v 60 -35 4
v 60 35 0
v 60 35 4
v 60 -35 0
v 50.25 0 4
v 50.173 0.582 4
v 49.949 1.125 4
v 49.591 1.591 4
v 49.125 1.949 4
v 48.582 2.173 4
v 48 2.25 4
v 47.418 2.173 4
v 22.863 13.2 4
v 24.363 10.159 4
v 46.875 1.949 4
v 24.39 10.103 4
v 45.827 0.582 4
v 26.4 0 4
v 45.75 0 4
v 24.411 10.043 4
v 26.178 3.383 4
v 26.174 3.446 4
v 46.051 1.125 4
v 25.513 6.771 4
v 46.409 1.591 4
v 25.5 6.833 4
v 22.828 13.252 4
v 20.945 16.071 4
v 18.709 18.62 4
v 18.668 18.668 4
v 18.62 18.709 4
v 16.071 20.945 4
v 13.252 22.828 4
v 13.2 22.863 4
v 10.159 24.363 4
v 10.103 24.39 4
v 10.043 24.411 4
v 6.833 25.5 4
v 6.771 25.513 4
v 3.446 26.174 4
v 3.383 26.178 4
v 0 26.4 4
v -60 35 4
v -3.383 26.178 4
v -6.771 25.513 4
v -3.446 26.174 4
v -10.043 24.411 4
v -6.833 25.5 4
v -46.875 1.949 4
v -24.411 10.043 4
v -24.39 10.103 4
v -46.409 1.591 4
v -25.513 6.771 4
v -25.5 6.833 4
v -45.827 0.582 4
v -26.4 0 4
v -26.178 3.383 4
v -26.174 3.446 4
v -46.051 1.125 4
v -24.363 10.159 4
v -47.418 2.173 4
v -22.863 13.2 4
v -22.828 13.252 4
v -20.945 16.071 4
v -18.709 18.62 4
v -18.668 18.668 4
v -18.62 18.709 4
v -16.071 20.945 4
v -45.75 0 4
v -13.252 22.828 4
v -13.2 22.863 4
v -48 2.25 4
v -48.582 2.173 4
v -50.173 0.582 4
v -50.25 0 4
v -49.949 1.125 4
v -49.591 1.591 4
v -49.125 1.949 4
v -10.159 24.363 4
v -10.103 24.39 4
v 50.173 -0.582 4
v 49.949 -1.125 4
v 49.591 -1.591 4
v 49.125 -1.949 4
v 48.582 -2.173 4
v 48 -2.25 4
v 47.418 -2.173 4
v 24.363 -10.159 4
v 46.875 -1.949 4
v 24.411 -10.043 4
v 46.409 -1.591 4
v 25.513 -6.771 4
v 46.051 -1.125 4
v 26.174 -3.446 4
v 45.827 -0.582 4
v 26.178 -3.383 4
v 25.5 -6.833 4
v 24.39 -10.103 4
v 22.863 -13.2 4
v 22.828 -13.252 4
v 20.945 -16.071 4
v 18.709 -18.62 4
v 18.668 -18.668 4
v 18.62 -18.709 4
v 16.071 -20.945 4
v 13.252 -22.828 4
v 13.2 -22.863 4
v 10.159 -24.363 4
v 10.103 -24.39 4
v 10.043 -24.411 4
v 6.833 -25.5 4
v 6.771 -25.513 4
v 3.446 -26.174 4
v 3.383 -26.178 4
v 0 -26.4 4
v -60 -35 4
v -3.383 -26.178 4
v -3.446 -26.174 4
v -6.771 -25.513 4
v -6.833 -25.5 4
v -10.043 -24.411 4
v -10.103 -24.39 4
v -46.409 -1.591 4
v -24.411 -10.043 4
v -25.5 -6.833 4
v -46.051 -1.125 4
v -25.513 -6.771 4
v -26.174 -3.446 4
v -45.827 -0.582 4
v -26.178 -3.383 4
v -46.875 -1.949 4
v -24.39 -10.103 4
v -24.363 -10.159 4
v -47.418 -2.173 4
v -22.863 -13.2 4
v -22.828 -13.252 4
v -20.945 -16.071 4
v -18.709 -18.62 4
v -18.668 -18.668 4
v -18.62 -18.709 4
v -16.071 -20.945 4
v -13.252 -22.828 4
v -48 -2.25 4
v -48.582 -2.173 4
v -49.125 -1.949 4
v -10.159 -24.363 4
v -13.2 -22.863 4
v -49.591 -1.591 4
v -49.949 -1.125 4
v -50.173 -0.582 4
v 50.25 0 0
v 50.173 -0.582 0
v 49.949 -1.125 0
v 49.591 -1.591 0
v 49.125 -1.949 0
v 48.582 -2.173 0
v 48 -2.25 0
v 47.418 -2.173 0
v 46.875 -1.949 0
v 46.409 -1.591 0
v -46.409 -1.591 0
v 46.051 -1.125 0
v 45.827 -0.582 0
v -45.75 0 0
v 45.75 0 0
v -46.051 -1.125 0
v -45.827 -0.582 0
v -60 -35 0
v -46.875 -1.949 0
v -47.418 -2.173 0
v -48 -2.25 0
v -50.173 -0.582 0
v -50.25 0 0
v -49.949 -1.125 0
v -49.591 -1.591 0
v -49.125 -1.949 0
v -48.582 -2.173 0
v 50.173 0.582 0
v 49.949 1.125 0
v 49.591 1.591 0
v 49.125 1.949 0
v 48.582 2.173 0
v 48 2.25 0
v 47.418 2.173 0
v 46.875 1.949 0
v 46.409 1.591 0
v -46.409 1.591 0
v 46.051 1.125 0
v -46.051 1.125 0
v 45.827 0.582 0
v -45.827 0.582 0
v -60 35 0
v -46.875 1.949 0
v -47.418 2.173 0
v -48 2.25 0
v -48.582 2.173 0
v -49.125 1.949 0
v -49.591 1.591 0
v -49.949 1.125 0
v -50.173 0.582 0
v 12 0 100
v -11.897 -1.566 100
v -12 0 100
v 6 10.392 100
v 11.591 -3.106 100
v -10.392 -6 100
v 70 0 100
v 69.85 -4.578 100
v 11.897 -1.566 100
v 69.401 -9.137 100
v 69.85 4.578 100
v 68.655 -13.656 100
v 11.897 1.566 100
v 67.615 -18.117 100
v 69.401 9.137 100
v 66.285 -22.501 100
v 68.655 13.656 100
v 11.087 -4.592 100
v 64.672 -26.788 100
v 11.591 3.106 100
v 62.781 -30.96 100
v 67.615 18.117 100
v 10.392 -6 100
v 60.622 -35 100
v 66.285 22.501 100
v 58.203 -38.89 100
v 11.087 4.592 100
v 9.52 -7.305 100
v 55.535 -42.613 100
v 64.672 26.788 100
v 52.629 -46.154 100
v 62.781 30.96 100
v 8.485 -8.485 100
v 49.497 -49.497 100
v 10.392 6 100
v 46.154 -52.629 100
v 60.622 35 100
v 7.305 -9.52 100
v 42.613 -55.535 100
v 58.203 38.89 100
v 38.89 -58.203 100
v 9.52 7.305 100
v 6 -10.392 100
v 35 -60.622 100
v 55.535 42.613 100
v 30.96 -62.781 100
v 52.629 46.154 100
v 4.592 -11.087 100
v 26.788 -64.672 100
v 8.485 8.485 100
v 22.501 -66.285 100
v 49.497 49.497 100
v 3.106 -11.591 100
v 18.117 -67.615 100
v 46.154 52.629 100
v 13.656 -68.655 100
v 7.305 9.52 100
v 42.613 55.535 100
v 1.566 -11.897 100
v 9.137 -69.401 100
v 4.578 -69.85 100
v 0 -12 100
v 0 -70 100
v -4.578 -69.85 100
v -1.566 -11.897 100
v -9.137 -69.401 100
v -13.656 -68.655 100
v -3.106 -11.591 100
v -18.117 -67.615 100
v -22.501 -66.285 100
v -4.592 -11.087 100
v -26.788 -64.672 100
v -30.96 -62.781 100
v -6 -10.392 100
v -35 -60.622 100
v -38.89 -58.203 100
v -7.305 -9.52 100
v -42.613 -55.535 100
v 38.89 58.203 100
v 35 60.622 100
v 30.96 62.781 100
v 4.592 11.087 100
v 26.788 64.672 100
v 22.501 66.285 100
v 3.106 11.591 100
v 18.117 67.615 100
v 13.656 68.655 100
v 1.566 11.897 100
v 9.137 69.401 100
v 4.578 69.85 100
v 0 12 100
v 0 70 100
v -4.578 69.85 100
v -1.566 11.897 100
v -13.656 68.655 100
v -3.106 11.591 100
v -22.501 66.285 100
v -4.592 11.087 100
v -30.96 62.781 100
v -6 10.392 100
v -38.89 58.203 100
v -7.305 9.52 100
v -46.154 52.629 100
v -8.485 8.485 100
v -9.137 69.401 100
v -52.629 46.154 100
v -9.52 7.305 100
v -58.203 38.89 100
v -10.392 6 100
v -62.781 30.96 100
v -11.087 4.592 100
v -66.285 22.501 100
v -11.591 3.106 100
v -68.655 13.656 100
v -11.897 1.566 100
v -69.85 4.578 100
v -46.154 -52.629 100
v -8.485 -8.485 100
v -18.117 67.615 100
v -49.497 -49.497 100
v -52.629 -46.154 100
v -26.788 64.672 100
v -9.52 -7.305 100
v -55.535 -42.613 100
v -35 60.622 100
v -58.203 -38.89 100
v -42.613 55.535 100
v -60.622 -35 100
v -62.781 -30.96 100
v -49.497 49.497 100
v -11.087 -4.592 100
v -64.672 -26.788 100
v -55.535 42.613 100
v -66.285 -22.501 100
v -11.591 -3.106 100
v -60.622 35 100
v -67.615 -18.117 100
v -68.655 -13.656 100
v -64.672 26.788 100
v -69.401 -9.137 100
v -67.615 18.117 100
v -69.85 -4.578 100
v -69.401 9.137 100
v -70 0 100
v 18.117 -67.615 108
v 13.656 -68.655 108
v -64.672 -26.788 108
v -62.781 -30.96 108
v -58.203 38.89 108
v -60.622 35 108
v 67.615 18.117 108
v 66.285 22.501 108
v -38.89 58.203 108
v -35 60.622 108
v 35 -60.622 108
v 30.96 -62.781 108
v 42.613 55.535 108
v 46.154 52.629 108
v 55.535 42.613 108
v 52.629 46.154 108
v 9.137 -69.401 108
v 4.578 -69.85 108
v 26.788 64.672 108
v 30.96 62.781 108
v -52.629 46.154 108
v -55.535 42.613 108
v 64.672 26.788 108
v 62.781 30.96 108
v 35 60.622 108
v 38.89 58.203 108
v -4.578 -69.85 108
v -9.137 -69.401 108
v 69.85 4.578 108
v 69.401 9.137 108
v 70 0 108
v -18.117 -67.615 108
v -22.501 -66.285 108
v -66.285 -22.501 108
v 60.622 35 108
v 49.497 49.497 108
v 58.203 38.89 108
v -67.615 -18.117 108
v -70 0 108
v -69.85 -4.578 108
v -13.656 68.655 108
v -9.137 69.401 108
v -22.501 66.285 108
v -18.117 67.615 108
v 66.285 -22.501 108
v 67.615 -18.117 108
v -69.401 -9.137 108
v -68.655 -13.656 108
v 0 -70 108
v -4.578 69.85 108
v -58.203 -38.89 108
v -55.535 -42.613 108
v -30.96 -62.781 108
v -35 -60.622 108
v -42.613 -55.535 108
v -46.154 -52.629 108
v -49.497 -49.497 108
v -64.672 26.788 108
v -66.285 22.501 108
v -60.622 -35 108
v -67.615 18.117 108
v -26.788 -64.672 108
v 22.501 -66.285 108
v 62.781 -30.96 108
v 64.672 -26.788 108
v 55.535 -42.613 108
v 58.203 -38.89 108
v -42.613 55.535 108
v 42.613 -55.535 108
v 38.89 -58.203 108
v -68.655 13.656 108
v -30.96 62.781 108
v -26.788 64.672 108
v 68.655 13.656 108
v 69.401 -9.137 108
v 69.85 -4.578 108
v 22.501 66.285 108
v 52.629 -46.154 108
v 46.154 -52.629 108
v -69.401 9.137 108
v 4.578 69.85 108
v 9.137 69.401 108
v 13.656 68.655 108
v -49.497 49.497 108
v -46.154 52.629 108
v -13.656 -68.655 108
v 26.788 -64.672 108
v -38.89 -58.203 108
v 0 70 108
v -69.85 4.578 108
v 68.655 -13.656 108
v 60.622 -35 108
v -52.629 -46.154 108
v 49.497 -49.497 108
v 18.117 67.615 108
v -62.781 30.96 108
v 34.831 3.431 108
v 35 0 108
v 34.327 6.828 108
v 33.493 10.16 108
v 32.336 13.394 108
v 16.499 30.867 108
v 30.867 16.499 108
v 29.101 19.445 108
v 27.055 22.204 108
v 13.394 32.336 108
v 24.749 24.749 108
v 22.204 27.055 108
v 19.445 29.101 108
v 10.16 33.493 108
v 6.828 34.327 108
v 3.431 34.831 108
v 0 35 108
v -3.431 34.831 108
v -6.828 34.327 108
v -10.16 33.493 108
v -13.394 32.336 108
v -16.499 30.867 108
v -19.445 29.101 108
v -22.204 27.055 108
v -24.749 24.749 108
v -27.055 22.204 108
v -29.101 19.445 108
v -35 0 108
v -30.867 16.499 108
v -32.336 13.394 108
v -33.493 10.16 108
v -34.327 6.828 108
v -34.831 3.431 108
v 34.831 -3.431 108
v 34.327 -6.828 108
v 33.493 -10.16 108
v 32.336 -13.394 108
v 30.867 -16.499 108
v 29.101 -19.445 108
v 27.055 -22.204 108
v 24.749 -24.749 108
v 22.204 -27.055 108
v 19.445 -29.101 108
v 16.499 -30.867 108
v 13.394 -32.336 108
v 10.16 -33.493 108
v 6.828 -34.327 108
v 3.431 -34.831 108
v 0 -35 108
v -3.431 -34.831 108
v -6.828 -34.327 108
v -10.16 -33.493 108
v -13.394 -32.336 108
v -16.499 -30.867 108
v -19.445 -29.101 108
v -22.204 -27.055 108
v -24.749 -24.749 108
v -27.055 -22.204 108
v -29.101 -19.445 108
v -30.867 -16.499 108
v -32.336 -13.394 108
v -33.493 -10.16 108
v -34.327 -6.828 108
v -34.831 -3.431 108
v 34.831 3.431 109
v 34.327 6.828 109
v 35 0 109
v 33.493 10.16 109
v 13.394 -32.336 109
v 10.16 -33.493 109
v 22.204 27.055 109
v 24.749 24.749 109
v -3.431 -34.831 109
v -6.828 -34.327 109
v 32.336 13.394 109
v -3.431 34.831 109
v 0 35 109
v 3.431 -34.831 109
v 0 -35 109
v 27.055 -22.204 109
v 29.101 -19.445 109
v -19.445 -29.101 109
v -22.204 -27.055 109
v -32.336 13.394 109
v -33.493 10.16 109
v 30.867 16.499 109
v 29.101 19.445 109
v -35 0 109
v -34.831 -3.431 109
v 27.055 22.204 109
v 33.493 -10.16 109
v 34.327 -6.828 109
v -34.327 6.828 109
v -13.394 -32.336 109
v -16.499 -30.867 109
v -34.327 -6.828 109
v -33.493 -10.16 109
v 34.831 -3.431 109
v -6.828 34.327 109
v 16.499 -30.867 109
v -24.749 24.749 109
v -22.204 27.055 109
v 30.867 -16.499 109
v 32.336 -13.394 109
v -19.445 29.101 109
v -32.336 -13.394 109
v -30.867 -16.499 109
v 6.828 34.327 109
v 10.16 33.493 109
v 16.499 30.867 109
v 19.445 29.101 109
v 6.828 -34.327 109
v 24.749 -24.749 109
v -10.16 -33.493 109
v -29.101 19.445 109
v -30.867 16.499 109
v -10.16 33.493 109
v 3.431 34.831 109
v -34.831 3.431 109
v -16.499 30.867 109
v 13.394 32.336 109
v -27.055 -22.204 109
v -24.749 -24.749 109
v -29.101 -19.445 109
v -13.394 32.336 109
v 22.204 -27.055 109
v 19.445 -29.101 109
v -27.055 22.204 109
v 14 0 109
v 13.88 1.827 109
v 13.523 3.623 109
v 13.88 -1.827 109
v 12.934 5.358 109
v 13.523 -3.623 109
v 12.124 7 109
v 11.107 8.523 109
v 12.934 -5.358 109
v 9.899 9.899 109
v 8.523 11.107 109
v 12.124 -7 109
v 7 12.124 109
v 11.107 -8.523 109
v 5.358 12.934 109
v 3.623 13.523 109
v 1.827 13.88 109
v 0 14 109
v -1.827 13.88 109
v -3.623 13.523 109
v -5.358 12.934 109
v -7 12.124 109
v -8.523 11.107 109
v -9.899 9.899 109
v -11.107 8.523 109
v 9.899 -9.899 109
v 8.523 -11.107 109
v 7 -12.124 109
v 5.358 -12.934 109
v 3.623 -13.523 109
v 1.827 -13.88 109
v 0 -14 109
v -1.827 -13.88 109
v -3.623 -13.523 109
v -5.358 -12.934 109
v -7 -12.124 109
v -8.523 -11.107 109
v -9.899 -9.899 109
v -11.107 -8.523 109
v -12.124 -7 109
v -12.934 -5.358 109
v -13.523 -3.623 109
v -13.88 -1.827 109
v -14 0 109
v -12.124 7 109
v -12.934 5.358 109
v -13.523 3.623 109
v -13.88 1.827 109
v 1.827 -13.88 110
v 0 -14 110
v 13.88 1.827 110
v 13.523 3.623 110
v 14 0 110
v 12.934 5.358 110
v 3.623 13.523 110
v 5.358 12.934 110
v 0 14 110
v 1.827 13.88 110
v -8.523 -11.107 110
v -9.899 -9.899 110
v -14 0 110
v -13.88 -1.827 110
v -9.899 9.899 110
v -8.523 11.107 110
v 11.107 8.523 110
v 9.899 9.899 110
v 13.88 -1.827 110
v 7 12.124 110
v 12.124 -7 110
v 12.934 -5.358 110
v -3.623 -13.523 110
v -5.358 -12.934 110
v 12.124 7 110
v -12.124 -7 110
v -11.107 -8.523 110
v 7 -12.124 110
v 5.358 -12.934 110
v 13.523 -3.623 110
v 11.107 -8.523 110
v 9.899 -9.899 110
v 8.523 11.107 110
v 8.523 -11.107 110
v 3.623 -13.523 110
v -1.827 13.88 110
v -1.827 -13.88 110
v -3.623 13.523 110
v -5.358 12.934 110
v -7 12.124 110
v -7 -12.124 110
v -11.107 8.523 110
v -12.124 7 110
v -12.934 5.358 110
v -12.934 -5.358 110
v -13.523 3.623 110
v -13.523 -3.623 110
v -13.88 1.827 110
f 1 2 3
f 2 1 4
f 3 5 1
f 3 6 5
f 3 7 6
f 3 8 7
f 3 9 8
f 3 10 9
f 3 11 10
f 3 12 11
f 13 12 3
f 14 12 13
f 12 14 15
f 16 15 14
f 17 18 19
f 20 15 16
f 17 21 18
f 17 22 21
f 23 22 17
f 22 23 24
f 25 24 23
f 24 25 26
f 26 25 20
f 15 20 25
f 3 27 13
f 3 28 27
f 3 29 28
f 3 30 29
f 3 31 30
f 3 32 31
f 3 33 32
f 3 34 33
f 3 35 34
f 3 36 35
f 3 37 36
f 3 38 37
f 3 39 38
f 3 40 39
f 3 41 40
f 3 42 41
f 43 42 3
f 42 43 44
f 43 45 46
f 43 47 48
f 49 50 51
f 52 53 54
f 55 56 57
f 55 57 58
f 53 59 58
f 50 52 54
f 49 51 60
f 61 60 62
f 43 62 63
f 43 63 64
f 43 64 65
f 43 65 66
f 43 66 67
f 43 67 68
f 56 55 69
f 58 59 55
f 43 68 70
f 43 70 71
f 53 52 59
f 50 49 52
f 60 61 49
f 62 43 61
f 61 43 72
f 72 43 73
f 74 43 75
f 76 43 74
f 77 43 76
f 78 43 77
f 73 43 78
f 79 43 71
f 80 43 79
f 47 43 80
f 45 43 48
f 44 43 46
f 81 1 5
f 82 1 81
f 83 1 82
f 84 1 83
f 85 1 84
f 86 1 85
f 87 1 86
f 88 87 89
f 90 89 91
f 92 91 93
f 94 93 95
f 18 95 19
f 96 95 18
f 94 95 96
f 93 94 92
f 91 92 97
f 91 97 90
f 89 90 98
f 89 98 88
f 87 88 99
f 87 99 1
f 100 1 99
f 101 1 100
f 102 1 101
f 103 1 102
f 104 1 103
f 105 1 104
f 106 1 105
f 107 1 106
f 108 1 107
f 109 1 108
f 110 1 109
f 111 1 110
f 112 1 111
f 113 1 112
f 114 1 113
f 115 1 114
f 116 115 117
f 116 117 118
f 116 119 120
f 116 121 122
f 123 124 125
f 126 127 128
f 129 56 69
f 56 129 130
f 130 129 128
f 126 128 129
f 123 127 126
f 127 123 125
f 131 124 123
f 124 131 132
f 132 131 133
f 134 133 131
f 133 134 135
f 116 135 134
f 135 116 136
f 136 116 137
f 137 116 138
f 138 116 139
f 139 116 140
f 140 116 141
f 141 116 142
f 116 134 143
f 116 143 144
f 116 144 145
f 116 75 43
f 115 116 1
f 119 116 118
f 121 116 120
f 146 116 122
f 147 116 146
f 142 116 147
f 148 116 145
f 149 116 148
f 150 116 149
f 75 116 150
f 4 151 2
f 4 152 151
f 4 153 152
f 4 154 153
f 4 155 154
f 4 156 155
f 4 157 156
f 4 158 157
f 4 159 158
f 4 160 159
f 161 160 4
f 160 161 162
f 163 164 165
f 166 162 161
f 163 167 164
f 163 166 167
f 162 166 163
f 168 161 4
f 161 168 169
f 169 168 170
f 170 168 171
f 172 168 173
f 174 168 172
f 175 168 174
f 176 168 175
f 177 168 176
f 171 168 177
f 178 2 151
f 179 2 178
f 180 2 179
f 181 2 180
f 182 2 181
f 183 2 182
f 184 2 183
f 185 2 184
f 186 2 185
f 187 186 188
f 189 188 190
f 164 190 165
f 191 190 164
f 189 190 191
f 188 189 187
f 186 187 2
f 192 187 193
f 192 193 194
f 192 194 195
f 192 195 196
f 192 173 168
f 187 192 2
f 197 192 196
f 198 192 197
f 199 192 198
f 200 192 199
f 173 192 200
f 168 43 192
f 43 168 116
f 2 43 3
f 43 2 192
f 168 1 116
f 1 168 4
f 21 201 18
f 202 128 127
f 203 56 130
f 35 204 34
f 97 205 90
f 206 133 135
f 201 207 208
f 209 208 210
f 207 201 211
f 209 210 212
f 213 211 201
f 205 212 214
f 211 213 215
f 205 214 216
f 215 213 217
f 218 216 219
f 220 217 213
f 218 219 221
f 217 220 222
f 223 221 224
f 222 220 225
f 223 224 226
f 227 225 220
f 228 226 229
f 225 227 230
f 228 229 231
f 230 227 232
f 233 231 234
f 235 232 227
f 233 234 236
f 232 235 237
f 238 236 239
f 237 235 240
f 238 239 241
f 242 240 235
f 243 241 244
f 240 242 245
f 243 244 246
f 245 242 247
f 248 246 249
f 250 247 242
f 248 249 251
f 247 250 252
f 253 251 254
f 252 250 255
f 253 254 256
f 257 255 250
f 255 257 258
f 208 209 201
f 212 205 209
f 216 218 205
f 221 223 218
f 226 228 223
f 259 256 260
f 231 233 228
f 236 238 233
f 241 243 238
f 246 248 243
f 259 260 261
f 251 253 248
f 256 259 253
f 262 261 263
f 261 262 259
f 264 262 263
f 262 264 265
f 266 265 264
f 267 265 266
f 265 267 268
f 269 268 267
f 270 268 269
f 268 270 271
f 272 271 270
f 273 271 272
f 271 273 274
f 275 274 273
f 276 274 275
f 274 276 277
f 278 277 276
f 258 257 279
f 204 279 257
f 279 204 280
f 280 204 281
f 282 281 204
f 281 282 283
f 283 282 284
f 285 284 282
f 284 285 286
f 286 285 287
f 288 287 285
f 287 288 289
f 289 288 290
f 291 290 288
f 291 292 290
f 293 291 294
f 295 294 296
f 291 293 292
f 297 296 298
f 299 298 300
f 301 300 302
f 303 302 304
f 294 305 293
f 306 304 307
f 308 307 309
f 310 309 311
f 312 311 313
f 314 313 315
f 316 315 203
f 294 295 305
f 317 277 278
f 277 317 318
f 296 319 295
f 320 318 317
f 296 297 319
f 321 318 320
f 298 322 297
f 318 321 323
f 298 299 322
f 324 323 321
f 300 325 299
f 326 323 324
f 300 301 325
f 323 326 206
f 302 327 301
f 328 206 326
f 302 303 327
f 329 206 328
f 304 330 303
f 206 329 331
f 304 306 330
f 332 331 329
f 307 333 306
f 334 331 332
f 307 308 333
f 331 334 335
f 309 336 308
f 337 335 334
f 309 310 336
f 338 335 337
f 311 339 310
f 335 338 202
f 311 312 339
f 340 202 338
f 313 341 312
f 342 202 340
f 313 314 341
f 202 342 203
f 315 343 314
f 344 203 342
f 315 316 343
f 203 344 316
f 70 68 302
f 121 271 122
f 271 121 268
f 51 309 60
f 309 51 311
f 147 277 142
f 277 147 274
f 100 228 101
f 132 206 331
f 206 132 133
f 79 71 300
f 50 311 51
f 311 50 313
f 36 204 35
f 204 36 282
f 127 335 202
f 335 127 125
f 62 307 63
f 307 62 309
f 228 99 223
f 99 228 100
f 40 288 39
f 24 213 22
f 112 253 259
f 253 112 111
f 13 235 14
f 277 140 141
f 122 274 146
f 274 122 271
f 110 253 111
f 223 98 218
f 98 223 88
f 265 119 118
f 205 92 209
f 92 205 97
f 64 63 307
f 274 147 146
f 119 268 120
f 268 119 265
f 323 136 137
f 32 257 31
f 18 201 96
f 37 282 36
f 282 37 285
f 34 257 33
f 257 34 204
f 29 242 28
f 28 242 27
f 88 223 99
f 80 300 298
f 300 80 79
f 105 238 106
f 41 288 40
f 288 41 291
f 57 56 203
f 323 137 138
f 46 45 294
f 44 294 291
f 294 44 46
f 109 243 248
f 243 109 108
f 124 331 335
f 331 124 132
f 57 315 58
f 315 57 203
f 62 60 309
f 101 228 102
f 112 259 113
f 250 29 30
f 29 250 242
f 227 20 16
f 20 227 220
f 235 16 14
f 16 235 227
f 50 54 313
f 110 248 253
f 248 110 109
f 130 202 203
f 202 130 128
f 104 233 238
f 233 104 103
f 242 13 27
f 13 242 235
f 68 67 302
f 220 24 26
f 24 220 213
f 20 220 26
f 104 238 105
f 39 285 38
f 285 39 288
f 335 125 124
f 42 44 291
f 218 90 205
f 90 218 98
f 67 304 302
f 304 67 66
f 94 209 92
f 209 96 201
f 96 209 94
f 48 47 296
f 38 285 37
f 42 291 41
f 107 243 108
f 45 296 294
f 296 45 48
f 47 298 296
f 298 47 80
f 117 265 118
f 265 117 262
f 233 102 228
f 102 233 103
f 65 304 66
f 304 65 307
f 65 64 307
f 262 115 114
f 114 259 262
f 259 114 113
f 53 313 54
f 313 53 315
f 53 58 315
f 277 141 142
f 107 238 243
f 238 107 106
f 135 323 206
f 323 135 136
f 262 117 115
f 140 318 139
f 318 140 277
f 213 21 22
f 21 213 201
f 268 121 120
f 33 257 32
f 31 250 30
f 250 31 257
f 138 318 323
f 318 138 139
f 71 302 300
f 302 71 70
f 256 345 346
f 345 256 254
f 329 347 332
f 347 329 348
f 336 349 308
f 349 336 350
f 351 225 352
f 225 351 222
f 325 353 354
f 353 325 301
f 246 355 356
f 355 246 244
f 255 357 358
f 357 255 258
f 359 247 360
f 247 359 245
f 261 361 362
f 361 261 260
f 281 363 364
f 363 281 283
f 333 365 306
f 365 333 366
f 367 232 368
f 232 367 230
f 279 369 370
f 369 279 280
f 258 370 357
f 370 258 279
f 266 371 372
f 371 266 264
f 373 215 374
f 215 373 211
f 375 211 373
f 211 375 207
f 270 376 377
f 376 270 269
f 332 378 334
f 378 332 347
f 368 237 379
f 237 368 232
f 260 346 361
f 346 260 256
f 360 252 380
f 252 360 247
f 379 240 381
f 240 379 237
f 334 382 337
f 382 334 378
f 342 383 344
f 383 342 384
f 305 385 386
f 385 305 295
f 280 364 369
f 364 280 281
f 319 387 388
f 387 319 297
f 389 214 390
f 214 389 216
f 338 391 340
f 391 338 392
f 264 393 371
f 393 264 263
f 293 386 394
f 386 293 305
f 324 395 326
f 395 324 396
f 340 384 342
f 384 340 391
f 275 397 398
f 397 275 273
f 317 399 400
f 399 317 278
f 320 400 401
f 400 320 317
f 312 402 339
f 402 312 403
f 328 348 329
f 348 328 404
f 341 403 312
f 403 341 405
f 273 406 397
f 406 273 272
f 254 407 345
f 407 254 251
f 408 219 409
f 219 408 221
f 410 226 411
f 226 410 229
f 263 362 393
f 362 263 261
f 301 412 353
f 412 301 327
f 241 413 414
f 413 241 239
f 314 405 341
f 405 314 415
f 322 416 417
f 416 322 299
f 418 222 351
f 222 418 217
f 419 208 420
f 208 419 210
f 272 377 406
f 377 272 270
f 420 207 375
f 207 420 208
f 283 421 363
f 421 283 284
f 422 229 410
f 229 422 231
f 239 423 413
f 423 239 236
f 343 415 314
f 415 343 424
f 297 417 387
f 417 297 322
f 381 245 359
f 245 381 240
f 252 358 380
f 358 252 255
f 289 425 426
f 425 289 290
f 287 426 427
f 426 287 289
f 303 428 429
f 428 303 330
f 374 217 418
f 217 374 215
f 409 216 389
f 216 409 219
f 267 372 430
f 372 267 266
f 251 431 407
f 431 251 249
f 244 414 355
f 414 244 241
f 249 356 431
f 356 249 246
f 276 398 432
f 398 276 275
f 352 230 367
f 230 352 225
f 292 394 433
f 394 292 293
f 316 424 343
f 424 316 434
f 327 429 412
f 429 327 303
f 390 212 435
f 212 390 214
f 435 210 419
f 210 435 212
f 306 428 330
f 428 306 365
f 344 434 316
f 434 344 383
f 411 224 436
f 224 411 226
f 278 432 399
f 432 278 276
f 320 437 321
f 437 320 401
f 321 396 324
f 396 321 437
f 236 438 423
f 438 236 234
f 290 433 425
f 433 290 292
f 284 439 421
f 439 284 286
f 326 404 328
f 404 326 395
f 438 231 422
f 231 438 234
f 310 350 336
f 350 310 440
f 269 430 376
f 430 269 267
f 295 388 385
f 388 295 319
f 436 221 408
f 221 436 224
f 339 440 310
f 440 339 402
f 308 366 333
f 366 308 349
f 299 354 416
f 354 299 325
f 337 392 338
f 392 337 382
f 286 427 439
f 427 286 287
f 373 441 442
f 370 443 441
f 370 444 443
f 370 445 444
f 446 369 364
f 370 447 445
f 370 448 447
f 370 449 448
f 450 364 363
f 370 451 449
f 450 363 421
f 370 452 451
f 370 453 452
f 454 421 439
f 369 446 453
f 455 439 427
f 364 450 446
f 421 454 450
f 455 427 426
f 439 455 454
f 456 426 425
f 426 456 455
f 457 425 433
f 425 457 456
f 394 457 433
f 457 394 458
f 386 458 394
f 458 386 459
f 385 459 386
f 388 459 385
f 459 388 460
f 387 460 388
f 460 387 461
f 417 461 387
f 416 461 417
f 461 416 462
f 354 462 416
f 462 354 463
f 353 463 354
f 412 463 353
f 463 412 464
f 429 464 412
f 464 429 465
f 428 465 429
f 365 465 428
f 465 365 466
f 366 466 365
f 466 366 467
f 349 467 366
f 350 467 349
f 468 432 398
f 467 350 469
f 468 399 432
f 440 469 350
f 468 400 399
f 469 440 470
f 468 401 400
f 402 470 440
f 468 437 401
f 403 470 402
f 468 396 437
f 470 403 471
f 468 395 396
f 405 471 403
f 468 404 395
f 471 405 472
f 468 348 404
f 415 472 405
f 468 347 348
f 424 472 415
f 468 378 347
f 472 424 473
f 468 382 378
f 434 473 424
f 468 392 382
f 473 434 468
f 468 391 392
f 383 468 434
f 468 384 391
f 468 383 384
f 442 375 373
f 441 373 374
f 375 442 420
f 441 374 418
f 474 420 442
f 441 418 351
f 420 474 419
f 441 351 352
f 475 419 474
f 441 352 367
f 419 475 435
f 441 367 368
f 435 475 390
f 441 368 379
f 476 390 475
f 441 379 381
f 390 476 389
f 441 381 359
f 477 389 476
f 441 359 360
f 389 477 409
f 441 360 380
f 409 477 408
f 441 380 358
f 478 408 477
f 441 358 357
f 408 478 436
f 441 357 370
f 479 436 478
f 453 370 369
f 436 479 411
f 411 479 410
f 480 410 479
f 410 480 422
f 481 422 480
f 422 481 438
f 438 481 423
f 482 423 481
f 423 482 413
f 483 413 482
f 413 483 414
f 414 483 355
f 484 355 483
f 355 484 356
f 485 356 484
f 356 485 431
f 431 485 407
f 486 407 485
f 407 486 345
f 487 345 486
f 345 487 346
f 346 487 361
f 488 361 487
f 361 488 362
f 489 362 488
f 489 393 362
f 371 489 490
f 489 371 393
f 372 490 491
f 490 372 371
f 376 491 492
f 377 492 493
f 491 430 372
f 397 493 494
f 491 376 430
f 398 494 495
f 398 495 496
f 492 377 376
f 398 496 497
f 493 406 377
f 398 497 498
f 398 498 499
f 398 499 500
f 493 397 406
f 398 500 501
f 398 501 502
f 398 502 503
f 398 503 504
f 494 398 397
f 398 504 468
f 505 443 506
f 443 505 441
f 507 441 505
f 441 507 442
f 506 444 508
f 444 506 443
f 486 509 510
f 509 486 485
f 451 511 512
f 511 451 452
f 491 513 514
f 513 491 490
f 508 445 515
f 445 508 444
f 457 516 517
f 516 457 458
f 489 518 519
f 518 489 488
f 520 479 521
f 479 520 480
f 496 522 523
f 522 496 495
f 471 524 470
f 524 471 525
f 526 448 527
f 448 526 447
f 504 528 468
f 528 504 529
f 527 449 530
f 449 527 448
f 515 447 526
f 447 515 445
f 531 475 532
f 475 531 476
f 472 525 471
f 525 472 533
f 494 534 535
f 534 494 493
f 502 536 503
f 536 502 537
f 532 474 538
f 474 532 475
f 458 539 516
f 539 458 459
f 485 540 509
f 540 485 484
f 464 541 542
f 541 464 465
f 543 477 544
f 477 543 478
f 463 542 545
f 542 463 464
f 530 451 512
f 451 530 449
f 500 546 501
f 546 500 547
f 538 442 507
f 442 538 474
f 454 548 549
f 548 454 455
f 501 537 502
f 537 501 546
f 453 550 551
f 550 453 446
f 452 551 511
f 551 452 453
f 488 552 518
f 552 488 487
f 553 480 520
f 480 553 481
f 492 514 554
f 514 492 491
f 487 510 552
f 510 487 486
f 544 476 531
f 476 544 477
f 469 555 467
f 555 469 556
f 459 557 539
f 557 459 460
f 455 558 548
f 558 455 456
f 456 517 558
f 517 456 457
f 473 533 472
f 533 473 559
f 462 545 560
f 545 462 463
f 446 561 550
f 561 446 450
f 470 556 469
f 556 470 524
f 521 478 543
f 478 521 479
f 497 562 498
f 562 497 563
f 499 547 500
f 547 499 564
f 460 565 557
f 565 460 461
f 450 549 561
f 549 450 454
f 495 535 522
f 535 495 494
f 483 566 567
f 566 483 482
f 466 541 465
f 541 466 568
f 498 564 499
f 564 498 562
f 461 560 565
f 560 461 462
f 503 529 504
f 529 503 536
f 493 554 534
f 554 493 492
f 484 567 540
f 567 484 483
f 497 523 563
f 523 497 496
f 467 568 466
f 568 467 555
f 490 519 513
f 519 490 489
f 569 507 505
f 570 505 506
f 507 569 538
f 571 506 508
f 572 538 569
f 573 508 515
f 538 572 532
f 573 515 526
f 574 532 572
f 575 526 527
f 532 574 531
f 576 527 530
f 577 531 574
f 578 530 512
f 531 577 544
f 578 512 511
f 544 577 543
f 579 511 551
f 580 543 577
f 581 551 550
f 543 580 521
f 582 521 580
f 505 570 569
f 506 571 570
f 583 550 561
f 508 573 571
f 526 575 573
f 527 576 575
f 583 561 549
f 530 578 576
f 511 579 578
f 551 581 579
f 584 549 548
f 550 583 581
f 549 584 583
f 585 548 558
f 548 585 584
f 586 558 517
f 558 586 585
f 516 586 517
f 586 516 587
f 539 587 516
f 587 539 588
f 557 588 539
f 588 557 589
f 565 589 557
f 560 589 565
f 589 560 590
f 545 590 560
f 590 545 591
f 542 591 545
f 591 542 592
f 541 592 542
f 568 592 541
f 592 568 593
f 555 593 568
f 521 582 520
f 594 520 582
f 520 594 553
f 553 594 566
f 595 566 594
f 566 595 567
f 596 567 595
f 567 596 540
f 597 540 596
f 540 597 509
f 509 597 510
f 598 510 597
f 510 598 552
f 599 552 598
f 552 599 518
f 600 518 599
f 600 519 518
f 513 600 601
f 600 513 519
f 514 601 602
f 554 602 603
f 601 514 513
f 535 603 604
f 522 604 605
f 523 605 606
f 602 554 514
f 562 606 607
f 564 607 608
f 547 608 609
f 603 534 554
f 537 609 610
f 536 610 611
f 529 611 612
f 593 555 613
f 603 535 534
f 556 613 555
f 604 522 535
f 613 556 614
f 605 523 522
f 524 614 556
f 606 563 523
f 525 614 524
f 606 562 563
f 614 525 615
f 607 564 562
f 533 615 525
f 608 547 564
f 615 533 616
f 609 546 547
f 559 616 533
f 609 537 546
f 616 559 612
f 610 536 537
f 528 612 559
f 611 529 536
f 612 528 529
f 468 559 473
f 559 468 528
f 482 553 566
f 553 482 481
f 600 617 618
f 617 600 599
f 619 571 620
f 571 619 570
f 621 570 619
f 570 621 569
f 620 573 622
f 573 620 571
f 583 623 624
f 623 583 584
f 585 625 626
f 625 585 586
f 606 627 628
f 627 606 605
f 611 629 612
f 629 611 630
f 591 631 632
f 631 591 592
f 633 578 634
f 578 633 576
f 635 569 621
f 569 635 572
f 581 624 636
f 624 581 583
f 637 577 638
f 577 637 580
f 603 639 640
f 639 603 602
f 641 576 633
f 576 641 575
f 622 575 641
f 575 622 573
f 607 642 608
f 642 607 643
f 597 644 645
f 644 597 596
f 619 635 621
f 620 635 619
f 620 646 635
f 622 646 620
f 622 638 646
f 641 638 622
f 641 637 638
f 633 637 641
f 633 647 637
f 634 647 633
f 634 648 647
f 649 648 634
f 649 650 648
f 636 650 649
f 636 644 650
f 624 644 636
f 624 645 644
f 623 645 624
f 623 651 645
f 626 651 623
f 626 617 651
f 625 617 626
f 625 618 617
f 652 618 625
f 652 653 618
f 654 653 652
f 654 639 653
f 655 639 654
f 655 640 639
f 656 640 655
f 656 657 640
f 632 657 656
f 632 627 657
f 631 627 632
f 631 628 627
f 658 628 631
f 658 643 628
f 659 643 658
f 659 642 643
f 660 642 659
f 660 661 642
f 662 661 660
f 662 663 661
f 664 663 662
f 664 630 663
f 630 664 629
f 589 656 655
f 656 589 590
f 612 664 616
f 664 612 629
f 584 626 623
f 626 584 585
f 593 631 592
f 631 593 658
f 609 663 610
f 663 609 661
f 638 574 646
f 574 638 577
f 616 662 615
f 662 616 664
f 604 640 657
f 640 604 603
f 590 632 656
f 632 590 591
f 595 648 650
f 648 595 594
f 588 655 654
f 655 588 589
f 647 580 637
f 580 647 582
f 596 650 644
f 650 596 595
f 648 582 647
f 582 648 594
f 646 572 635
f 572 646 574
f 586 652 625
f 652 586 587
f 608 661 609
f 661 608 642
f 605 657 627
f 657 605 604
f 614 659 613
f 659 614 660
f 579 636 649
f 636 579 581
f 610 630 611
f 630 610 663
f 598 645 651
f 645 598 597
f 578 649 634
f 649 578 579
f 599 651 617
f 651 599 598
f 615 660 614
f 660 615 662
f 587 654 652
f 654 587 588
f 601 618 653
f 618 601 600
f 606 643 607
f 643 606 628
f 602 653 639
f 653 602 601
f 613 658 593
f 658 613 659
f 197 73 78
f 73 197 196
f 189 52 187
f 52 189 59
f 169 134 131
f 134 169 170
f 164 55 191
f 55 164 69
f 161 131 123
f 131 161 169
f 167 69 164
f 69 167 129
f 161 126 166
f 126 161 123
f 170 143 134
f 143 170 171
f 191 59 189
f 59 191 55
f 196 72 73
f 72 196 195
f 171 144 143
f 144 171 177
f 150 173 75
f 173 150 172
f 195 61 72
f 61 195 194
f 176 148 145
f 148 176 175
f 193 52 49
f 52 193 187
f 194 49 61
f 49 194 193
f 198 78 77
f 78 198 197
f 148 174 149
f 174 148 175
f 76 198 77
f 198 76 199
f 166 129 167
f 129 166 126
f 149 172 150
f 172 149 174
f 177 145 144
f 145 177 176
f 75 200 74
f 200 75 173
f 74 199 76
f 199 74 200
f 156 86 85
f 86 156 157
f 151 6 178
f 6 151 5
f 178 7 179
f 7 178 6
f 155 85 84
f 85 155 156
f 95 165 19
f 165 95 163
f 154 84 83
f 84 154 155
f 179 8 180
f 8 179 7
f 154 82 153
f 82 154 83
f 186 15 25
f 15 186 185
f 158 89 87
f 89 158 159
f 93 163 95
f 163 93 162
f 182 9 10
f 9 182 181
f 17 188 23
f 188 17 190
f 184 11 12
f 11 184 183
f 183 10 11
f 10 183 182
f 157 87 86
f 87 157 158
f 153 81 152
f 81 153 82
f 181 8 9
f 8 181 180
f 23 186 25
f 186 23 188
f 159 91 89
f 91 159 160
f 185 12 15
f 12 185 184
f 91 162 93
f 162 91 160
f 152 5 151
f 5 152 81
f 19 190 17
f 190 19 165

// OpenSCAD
platform_diameter=140; landing_height=100; platform_thickness=8; base_length=120; base_depth=70; mount_hole_diameter=4.5;
module bullseye_pedestal(){ difference(){ union(){ translate([-base_length/2,-base_depth/2,0]) cube([base_length,base_depth,4]); cylinder(d1=54,d2=24,h=landing_height,$fn=48); translate([0,0,landing_height]) cylinder(d=platform_diameter,h=platform_thickness,$fn=96); translate([0,0,landing_height+platform_thickness]) cylinder(d=70,h=1,$fn=64); translate([0,0,landing_height+platform_thickness+1]) cylinder(d=28,h=1,$fn=48); } for(x=[-48,48]) translate([x,0,-1]) cylinder(d=mount_hole_diameter,h=7,$fn=24); }}
assert(platform_diameter==140 && landing_height==100); echo("SCADCTL_REQUIREMENT:parameters:PASS"); bullseye_pedestal();
